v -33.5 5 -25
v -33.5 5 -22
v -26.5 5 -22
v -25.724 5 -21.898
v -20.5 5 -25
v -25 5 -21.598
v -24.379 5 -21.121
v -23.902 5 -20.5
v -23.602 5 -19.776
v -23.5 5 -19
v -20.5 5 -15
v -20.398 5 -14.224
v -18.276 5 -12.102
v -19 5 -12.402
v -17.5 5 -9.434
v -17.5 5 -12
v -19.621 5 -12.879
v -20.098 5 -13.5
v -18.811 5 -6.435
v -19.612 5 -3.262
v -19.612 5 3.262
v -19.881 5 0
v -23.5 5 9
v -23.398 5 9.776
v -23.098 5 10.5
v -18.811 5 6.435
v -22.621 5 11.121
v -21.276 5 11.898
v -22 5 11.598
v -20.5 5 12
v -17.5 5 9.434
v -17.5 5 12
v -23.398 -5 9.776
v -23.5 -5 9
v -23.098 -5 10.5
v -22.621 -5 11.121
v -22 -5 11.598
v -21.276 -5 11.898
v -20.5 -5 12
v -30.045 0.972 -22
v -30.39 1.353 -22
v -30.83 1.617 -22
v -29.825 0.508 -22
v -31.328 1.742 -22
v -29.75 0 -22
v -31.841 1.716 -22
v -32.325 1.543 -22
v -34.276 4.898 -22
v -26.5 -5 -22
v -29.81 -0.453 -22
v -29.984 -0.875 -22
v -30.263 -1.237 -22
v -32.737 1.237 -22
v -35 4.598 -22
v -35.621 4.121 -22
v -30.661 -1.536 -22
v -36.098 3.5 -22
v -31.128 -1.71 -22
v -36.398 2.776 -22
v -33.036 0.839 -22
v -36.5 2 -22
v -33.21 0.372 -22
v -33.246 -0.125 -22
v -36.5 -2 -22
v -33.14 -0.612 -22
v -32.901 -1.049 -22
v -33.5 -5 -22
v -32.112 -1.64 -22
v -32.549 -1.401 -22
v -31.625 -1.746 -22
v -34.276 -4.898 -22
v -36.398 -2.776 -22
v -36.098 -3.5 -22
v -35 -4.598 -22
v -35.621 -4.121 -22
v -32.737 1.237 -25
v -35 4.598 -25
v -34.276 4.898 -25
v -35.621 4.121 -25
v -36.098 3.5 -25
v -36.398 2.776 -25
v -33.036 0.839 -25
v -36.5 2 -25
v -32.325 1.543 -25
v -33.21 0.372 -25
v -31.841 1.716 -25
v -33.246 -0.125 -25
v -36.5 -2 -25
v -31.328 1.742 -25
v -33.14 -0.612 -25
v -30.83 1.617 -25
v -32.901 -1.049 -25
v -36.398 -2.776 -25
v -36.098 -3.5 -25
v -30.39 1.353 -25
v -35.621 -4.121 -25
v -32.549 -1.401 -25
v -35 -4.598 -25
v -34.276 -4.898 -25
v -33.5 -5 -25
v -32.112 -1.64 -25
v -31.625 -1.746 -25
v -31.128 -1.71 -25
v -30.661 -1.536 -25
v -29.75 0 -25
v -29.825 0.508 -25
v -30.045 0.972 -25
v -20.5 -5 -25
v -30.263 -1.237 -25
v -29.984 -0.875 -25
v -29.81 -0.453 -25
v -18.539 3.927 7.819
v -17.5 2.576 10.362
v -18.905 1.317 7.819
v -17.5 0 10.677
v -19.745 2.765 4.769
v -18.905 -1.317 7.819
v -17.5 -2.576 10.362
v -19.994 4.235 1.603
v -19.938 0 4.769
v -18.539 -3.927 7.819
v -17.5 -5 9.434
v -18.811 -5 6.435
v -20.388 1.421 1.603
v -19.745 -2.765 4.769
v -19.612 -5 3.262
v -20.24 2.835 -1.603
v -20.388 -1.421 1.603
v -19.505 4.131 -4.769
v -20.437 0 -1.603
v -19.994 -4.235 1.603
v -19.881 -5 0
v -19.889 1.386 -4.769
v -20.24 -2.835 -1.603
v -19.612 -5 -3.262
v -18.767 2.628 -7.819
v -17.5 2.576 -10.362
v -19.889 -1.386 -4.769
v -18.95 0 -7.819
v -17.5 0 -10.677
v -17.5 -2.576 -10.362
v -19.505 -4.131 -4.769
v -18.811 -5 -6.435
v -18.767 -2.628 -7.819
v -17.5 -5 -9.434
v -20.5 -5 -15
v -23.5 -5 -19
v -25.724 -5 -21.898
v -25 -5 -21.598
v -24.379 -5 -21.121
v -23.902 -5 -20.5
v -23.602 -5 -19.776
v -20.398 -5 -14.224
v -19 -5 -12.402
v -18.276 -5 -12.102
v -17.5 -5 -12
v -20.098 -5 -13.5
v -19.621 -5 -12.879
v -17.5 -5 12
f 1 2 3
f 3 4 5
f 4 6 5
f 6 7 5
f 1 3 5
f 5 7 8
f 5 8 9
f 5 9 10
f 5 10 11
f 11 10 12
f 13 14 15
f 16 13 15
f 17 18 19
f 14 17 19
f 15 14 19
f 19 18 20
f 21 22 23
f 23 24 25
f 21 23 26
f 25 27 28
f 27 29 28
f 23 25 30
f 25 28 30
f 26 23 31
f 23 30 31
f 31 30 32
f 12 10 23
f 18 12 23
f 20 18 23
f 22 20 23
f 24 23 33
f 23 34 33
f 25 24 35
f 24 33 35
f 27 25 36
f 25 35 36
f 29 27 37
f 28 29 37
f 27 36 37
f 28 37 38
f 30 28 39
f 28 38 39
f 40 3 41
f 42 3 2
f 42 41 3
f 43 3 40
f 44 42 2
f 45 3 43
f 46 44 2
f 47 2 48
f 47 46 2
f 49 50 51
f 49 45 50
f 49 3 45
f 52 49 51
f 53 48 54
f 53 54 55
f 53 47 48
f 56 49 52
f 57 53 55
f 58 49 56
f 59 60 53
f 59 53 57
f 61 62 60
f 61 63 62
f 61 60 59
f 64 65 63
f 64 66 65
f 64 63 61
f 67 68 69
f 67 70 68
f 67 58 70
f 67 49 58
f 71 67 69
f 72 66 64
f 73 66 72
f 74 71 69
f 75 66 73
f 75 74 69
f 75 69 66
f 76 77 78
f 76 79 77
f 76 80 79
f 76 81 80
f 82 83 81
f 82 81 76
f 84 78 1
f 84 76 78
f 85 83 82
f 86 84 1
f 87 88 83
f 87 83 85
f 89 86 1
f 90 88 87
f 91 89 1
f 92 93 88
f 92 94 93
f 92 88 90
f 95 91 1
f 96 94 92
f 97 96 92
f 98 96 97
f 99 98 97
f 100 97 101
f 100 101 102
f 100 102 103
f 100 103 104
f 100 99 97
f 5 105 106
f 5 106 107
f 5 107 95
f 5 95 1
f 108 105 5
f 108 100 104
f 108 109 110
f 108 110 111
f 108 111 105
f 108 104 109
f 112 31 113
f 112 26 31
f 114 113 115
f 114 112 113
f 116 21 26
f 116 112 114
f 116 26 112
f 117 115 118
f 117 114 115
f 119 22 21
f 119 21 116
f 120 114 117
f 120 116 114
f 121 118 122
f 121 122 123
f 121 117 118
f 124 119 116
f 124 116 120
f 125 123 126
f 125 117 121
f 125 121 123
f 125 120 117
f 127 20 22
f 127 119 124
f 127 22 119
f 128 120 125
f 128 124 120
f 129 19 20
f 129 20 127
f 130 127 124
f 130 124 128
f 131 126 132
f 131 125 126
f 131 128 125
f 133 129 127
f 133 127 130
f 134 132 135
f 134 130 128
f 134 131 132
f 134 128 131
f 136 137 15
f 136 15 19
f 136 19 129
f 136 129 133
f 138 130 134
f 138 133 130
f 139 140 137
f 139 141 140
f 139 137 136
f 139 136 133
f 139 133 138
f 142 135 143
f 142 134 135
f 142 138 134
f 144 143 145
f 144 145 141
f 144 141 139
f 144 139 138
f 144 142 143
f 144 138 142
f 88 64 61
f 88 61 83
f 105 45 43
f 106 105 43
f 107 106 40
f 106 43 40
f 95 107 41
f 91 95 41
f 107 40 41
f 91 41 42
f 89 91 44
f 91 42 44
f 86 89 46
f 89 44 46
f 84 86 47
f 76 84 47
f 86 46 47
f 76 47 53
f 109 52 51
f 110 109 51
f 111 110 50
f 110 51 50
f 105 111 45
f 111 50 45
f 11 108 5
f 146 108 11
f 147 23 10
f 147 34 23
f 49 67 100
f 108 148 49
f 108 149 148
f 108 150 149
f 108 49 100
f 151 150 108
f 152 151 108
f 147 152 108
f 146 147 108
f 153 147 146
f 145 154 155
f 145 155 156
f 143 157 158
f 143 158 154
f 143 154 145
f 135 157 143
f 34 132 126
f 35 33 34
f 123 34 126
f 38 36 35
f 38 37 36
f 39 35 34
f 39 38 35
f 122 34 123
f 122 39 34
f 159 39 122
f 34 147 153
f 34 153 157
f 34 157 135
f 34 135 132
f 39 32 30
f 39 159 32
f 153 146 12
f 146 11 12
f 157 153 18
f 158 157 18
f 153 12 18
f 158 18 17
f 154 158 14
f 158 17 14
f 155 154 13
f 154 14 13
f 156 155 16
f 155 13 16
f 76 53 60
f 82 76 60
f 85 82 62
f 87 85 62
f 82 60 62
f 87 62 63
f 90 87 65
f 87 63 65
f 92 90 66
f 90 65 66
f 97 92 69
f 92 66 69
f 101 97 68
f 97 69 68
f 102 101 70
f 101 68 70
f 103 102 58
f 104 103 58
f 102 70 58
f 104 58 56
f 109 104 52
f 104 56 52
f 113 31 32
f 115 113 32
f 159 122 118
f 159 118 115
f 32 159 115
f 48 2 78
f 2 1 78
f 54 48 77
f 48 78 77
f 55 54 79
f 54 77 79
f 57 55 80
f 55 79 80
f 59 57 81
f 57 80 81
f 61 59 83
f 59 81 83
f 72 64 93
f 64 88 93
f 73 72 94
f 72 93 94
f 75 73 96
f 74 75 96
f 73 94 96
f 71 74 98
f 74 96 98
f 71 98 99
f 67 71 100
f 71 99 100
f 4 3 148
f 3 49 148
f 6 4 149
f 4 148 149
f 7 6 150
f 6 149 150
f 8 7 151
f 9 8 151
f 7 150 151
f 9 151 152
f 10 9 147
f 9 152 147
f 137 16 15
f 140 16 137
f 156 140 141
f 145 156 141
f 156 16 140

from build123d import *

# Parameters (mm, degrees)
F1_W          = 3
F1_H          = 12
F2_DEPTH      = 5
F2_DEPTH_BACK = 5
F4_R          = 3
F5_R          = 2.99999
F7_DEPTH      = 25
F8_R          = 3


# Not quite as in the source:
# - a fillet or chamfer is up to 0.001 mm smaller than in the source, because OpenCascade refuses the exact size


with BuildPart() as f2:
    # F1 (on Front) → F2 (new body, two sides)
    with BuildSketch(Plane.XZ) as f2_sk:
        with Locations((-19, -6)):
            Rectangle(F1_W, F1_H)
        Polygon((-20.5, 0), (-17.5, 0), (-17.5, 12), (-23.5, 12), (-23.5, -22), (-36.5, -22), (-36.5, -25), (-20.5, -25), (-20.5, -12), align=None)
    extrude(amount=F2_DEPTH)
    extrude(f2_sk.sketch, amount=-F2_DEPTH_BACK)

    # F0 (on Front) → F3 (revolve, cut)
    with BuildSketch(Plane.XZ):
        with BuildLine():
            Line((0, -20.5), (0, 20.5))
            ThreePointArc((0, 20.5), (-20.5, 0), (0, -20.5))
        make_face()
    revolve(axis=Axis((0, 0, 0), (0, 0, 1)), mode=Mode.SUBTRACT)

    # F4
    f4_edges = [f2.edges().sort_by_distance(p)[0] for p in [
        (-23.5, 0, 12),
        (-23.5, 0, -22),
    ]]
    fillet(f4_edges, radius=F4_R)

    # F5 (radius 3 in the source; OpenCascade refuses exactly that, so slightly less here)
    f5_edges = [f2.edges().sort_by_distance(p)[0] for p in [
        (-20.5, 0, -12),
    ]]
    fillet(f5_edges, radius=F5_R)

    # F6 (on face) → F7 (cut)
    with BuildSketch(Plane.XY.offset(-22)):
        with BuildLine():
            ThreePointArc((-29.75, 0), (-30.8303039934, 1.6167891819), (-32.7374368671, 1.2374368671))
            Line((-32.7374368671, 1.2374368671), (-30.2625631329, -1.2374368671))
            ThreePointArc((-30.2625631329, -1.2374368671), (-29.8832108181, -0.6696960066), (-29.75, 0))
        make_face()
        with BuildLine():
            Line((-30.2625631329, -1.2374368671), (-32.7374368671, 1.2374368671))
            ThreePointArc((-32.7374368671, 1.2374368671), (-32.7374368671, -1.2374368671), (-30.2625631329, -1.2374368671))
        make_face()
    extrude(amount=-F7_DEPTH, mode=Mode.SUBTRACT)

    # F8
    f8_edges = [f2.edges().sort_by_distance(p)[0] for p in [
        (-36.5, -5, -23.5),
        (-36.5, 5, -23.5),
    ]]
    fillet(f8_edges, radius=F8_R)


solid = f2.part
